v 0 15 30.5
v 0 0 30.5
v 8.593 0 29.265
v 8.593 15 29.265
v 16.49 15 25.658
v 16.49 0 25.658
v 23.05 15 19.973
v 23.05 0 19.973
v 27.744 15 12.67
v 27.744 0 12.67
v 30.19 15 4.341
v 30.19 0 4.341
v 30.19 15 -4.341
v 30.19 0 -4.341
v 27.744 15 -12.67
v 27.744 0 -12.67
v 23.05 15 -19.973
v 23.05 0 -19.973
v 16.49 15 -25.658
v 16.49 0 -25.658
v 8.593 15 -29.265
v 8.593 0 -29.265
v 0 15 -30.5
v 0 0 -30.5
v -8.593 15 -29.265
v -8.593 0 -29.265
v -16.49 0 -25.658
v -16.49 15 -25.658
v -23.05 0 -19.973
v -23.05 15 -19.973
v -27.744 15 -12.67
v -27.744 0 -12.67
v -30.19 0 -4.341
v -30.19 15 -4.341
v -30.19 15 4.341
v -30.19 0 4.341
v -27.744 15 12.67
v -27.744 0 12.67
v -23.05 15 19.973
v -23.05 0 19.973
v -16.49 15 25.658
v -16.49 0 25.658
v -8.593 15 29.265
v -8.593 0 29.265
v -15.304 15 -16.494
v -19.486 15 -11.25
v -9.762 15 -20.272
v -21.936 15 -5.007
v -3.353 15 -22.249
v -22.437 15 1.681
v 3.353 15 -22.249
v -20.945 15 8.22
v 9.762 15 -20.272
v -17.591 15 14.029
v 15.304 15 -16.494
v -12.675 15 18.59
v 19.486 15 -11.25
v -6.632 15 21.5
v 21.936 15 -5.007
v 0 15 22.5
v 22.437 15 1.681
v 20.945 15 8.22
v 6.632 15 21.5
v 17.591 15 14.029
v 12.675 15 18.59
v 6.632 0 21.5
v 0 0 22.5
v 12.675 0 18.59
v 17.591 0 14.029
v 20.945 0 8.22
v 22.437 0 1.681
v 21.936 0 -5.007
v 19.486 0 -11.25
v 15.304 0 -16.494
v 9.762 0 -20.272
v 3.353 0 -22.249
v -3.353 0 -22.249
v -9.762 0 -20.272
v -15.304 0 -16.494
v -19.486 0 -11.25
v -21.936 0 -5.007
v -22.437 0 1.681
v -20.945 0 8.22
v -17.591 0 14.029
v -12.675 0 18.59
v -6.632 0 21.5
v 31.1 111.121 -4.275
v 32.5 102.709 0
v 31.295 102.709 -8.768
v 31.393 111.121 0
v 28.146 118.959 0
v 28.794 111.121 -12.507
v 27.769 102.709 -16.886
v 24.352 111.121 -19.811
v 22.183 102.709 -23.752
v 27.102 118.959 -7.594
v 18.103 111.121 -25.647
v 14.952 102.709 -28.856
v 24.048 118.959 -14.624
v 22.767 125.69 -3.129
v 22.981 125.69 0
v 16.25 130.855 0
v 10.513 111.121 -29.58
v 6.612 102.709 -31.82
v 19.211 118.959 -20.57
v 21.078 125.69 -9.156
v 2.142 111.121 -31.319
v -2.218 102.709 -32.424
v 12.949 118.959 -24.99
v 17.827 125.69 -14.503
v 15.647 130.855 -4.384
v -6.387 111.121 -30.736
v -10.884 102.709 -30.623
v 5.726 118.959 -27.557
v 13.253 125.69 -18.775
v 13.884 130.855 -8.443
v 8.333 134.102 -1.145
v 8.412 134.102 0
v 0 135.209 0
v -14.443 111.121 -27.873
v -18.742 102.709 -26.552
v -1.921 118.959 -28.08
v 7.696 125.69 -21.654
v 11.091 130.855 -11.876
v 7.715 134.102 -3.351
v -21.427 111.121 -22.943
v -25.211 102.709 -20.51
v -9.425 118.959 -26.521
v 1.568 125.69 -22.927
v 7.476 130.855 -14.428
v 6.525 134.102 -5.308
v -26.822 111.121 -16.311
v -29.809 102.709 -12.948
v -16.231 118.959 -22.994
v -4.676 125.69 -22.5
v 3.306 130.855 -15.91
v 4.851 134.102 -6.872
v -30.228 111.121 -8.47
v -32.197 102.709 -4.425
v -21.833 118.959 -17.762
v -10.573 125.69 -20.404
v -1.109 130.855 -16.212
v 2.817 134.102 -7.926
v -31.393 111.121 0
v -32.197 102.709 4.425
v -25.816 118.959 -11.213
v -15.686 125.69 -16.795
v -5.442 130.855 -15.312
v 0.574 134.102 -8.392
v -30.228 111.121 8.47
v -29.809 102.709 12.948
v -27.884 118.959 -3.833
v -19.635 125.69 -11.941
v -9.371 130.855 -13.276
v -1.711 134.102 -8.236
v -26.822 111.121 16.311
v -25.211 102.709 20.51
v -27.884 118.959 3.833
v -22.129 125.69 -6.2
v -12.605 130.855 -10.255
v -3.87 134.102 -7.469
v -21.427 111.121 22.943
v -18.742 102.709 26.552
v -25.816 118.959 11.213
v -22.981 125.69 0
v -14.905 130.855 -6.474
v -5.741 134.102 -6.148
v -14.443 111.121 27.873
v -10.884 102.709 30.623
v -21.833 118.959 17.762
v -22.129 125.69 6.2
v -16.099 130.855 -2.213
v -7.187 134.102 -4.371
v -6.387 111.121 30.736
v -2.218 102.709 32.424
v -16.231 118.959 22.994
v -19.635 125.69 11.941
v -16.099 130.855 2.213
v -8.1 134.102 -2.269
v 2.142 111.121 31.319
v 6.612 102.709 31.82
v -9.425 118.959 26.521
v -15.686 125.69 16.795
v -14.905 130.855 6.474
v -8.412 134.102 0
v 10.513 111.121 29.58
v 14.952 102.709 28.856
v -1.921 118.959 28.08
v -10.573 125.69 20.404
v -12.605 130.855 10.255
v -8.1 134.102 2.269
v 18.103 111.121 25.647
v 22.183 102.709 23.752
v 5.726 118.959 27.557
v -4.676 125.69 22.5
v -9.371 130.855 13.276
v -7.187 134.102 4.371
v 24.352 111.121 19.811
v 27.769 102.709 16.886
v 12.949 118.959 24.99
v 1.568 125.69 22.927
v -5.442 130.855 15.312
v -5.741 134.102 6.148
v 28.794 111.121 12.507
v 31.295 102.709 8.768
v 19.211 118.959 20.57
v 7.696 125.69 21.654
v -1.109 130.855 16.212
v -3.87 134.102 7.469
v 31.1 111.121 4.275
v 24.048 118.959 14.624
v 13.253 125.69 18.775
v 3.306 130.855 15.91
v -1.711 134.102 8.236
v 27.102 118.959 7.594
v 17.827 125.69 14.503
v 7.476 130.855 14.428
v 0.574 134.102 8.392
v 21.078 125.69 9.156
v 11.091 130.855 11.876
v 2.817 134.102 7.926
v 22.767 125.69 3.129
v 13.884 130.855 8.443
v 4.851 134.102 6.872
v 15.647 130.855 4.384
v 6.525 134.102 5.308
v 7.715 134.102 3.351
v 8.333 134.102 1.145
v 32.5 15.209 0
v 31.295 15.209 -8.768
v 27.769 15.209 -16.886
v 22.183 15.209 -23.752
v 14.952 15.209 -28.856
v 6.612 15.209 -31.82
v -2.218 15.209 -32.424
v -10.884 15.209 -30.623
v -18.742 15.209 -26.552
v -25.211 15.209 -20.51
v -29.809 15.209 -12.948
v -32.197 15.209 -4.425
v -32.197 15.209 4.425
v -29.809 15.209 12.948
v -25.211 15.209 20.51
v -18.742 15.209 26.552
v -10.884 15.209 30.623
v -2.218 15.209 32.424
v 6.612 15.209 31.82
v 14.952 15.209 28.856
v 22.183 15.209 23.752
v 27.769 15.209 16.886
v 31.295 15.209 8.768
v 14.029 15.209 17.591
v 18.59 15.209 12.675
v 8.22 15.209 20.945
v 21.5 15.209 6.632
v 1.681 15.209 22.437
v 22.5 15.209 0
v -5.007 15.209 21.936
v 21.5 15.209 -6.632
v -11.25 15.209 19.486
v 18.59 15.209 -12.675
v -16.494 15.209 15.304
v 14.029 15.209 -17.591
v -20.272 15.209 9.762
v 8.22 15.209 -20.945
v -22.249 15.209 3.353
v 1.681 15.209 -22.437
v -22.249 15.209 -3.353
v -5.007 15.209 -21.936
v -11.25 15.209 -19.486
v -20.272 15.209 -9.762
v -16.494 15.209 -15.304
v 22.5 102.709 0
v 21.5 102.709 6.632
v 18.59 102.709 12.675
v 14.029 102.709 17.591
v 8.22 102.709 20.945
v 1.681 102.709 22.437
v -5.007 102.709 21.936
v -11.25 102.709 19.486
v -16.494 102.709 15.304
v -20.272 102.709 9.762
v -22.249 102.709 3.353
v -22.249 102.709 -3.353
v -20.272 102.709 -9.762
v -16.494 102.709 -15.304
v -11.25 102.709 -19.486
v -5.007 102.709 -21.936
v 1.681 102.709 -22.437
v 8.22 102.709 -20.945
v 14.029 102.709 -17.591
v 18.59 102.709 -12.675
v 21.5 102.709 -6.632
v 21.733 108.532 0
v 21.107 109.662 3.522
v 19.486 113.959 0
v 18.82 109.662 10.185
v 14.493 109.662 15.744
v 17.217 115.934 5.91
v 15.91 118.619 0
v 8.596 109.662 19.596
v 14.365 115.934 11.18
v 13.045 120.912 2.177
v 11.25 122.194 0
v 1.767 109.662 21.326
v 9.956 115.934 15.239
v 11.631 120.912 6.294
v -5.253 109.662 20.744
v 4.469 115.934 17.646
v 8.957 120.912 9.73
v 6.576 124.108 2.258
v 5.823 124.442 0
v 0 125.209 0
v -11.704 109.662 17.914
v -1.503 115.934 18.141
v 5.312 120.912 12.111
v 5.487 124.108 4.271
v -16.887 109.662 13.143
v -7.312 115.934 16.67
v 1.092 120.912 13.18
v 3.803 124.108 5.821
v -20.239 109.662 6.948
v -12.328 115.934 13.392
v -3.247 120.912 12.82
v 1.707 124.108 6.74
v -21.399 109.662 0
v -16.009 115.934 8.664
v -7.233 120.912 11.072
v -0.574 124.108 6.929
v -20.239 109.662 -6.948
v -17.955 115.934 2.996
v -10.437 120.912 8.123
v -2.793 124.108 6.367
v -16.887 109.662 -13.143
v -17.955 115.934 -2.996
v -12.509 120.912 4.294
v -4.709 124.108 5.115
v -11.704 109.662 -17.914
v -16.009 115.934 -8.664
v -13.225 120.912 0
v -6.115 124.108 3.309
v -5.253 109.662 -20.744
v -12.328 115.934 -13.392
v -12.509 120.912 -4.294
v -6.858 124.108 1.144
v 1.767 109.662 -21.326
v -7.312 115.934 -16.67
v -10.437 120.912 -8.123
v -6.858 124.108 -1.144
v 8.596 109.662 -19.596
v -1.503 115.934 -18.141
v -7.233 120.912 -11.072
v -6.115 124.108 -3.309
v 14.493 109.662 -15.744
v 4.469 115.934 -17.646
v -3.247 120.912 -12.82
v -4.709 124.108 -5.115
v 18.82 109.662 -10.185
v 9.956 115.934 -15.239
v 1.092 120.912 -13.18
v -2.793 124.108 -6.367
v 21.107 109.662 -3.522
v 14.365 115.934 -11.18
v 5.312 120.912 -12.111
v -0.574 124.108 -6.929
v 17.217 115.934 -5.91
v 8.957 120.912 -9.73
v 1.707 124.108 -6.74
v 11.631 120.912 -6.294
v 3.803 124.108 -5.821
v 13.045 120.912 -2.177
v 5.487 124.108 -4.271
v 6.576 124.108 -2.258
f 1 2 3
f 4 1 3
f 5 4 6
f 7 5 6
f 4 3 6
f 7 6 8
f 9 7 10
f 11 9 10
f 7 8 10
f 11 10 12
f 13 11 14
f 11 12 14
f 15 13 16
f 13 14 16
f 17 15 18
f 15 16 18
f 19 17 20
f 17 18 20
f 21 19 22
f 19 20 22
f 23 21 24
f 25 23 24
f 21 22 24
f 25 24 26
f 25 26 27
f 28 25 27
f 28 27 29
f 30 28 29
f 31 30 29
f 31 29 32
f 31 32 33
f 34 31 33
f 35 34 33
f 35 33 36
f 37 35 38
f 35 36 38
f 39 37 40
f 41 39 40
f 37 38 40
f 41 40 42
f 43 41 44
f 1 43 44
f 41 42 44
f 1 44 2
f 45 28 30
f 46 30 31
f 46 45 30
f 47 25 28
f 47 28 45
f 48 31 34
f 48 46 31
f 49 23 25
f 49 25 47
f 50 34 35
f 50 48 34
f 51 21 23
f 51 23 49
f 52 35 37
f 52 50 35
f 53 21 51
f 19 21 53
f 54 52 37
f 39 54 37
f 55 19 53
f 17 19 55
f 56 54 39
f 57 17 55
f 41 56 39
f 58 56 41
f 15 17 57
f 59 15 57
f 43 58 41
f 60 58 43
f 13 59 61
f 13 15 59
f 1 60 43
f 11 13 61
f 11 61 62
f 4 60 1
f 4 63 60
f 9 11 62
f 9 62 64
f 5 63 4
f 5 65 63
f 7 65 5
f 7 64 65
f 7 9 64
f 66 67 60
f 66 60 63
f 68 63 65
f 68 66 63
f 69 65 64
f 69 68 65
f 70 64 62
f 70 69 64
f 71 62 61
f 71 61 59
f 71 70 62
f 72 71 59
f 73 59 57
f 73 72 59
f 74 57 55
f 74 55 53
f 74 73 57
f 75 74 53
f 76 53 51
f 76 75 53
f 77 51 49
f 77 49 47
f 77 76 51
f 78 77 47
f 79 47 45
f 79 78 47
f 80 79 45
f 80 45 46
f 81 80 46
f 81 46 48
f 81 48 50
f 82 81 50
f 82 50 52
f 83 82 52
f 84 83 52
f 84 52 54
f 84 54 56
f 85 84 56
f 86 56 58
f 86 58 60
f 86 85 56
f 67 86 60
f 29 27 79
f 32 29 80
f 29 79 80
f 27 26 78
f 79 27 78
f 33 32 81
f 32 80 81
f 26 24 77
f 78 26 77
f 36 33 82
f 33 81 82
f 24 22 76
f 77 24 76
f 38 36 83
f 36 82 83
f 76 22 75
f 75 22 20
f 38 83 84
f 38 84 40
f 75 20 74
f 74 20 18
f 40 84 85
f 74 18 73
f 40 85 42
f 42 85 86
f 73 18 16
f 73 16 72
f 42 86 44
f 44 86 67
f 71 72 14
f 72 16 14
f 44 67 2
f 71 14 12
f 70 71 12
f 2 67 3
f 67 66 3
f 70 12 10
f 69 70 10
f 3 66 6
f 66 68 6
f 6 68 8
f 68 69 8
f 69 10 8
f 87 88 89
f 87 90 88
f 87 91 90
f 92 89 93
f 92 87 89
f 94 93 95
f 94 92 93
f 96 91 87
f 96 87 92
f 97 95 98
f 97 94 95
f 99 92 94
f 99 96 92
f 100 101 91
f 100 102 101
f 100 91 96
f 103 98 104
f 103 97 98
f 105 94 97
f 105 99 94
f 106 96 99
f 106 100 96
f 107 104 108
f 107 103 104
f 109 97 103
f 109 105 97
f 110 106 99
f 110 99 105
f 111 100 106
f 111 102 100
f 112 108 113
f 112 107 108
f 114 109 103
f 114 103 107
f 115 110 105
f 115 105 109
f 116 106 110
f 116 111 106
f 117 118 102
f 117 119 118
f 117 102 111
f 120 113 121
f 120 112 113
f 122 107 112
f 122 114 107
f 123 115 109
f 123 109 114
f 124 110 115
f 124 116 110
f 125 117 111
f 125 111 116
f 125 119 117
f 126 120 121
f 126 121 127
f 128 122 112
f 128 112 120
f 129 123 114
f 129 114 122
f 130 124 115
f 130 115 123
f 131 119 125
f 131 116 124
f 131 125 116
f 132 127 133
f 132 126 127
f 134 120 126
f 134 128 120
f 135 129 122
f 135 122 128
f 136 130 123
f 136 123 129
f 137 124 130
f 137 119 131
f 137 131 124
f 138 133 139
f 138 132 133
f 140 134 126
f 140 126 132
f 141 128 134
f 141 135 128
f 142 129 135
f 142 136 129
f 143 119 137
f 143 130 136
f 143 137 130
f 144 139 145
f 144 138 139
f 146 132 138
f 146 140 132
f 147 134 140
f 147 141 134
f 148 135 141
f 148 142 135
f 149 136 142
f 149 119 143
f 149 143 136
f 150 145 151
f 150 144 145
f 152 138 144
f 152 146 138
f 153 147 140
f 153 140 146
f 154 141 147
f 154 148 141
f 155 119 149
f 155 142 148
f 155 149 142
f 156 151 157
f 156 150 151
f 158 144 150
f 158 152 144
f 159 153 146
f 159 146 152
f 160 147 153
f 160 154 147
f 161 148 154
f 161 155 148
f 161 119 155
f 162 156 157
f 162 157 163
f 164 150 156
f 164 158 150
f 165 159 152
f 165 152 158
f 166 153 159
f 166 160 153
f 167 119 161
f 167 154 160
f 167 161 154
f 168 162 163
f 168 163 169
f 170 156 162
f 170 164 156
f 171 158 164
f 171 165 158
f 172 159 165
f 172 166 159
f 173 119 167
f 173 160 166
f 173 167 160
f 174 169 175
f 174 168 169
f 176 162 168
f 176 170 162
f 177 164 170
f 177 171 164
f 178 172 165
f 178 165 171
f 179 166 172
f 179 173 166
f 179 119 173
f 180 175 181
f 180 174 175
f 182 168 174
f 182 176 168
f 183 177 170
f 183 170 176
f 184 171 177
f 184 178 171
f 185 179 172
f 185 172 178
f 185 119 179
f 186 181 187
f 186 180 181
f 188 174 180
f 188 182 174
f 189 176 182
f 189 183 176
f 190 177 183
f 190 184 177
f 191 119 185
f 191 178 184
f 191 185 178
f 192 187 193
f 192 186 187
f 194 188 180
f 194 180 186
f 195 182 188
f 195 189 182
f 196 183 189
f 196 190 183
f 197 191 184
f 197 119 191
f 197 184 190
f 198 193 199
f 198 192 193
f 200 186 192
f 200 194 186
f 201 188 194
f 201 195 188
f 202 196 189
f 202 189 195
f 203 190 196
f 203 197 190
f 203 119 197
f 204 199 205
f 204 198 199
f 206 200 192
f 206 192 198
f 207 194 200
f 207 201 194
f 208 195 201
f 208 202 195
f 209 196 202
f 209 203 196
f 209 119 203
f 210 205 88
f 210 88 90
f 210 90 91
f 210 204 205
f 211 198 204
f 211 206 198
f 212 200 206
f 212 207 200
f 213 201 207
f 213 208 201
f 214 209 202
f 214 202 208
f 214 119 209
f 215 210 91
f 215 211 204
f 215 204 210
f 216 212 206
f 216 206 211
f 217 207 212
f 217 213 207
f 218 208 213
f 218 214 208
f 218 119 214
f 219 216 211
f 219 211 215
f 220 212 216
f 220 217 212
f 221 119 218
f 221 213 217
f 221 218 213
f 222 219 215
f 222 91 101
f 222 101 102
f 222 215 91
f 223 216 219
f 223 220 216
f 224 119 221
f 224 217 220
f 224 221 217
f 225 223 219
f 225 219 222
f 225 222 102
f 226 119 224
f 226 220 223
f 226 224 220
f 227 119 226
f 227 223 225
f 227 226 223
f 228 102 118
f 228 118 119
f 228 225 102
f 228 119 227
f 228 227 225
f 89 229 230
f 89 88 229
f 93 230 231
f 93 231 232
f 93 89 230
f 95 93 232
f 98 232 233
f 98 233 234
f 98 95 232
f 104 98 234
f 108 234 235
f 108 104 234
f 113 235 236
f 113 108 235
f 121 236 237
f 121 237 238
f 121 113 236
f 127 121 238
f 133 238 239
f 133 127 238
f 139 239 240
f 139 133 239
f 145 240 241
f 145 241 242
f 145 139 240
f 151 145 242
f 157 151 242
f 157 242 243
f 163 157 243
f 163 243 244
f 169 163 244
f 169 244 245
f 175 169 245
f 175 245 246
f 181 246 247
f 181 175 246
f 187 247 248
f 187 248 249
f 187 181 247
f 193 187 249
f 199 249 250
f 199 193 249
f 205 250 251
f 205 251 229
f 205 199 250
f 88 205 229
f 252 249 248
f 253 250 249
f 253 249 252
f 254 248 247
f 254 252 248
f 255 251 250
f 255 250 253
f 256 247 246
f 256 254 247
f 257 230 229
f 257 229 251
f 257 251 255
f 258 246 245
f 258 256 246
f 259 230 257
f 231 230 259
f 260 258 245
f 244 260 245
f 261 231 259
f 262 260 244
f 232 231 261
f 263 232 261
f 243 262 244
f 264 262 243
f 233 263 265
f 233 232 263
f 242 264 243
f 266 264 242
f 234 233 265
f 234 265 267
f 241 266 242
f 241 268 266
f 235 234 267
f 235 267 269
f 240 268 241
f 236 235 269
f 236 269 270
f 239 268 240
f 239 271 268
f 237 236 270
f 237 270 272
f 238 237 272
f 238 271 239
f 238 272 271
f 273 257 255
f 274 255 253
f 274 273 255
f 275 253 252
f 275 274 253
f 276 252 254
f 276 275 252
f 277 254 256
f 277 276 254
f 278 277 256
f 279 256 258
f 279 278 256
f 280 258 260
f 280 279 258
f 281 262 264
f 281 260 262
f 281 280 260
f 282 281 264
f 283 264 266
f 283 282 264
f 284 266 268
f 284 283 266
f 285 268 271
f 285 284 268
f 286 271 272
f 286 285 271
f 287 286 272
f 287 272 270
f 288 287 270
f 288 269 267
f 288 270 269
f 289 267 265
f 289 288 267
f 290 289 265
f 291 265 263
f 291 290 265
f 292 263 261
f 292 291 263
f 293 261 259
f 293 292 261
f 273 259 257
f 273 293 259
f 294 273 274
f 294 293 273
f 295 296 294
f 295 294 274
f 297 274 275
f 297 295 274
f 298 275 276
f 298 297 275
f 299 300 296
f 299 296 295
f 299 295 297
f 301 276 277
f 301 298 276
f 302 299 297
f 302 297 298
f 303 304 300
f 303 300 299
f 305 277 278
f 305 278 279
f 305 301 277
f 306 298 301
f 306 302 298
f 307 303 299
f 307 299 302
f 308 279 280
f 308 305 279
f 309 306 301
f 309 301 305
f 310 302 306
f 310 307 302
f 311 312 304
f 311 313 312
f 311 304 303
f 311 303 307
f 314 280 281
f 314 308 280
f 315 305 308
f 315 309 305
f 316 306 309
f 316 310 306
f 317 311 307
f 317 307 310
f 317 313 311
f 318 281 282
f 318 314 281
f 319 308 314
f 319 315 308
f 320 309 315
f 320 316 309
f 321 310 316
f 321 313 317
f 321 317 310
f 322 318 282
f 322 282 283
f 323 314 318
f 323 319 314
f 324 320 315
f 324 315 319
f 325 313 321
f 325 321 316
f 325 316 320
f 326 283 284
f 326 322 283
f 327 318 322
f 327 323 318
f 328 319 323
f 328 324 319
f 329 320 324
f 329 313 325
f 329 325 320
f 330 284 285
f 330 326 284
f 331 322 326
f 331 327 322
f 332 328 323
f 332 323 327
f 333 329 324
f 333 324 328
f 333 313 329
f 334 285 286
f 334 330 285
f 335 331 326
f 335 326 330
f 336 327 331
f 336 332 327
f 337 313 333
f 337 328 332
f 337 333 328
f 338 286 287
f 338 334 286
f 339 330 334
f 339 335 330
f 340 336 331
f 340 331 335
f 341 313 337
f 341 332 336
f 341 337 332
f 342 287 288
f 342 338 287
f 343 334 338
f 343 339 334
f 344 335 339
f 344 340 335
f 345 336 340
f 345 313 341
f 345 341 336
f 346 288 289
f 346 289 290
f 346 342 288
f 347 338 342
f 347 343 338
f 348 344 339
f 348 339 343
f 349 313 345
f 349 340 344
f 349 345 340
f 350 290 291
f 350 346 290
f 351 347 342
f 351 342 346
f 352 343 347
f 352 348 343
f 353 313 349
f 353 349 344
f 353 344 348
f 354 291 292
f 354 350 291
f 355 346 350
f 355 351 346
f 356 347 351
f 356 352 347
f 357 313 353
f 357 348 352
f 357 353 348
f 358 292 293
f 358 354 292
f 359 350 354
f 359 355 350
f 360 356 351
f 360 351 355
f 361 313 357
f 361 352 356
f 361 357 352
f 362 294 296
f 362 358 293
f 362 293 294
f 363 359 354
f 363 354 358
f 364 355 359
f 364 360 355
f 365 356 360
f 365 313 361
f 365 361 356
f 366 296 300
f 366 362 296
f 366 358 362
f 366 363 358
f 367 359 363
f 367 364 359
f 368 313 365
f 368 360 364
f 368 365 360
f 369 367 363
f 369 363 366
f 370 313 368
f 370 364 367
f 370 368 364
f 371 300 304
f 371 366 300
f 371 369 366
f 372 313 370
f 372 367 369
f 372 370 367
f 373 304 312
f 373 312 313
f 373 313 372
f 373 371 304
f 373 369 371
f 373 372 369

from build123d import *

# Parameters (mm, degrees)
SKETCH1_R           = 30.5
SKETCH1_R_2         = 22.5
BOSS_EXTRUDE2_DEPTH = 15


with BuildPart() as part:
    # Sketch1 → Boss-Extrude2 (new body)
    with BuildSketch(Plane(origin=(0, 0, 0), x_dir=(1, 0, 0), z_dir=(0, 1, 0))):
        with Locations(Location((0, 0, 0), (0, 0, 270))):
            Circle(SKETCH1_R)
        with Locations(Location((0, 0, 0), (0, 0, 270))):
            Circle(SKETCH1_R_2, mode=Mode.SUBTRACT)
    extrude(amount=BOSS_EXTRUDE2_DEPTH)


with BuildPart() as body_2:
    # Sketch5 → Revolve2 (revolve)
    with BuildSketch(Plane.XY):
        with BuildLine():
            Line((0, 15.208932423), (32.5, 15.208932423))
            Line((32.5, 15.208932423), (32.5, 102.70890373))
            ThreePointArc((32.5, 102.70890373), (22.980980533, 125.689892667), (0, 135.208932423))
            Line((0, 135.208932423), (0, 15.208932423))
        make_face()
    revolve(axis=Axis((0, 24.300324325, 0), (0, 1, 0)))

    # Sketch6 → Cut-Revolve2 (revolve, cut)
    with BuildSketch(Plane.XY):
        with BuildLine():
            Line((22.5, 15), (22.5, 102.70890373))
            ThreePointArc((22.5, 102.70890373), (15.909902577, 118.618806306), (0, 125.20890373))
            Line((0, 125.20890373), (0, 15))
            Line((0, 15), (22.5, 15))
        make_face()
    revolve(axis=Axis((0, 102.70890373, 0), (0, -1, 0)), mode=Mode.SUBTRACT)


solid = Compound([part.part, body_2.part])
